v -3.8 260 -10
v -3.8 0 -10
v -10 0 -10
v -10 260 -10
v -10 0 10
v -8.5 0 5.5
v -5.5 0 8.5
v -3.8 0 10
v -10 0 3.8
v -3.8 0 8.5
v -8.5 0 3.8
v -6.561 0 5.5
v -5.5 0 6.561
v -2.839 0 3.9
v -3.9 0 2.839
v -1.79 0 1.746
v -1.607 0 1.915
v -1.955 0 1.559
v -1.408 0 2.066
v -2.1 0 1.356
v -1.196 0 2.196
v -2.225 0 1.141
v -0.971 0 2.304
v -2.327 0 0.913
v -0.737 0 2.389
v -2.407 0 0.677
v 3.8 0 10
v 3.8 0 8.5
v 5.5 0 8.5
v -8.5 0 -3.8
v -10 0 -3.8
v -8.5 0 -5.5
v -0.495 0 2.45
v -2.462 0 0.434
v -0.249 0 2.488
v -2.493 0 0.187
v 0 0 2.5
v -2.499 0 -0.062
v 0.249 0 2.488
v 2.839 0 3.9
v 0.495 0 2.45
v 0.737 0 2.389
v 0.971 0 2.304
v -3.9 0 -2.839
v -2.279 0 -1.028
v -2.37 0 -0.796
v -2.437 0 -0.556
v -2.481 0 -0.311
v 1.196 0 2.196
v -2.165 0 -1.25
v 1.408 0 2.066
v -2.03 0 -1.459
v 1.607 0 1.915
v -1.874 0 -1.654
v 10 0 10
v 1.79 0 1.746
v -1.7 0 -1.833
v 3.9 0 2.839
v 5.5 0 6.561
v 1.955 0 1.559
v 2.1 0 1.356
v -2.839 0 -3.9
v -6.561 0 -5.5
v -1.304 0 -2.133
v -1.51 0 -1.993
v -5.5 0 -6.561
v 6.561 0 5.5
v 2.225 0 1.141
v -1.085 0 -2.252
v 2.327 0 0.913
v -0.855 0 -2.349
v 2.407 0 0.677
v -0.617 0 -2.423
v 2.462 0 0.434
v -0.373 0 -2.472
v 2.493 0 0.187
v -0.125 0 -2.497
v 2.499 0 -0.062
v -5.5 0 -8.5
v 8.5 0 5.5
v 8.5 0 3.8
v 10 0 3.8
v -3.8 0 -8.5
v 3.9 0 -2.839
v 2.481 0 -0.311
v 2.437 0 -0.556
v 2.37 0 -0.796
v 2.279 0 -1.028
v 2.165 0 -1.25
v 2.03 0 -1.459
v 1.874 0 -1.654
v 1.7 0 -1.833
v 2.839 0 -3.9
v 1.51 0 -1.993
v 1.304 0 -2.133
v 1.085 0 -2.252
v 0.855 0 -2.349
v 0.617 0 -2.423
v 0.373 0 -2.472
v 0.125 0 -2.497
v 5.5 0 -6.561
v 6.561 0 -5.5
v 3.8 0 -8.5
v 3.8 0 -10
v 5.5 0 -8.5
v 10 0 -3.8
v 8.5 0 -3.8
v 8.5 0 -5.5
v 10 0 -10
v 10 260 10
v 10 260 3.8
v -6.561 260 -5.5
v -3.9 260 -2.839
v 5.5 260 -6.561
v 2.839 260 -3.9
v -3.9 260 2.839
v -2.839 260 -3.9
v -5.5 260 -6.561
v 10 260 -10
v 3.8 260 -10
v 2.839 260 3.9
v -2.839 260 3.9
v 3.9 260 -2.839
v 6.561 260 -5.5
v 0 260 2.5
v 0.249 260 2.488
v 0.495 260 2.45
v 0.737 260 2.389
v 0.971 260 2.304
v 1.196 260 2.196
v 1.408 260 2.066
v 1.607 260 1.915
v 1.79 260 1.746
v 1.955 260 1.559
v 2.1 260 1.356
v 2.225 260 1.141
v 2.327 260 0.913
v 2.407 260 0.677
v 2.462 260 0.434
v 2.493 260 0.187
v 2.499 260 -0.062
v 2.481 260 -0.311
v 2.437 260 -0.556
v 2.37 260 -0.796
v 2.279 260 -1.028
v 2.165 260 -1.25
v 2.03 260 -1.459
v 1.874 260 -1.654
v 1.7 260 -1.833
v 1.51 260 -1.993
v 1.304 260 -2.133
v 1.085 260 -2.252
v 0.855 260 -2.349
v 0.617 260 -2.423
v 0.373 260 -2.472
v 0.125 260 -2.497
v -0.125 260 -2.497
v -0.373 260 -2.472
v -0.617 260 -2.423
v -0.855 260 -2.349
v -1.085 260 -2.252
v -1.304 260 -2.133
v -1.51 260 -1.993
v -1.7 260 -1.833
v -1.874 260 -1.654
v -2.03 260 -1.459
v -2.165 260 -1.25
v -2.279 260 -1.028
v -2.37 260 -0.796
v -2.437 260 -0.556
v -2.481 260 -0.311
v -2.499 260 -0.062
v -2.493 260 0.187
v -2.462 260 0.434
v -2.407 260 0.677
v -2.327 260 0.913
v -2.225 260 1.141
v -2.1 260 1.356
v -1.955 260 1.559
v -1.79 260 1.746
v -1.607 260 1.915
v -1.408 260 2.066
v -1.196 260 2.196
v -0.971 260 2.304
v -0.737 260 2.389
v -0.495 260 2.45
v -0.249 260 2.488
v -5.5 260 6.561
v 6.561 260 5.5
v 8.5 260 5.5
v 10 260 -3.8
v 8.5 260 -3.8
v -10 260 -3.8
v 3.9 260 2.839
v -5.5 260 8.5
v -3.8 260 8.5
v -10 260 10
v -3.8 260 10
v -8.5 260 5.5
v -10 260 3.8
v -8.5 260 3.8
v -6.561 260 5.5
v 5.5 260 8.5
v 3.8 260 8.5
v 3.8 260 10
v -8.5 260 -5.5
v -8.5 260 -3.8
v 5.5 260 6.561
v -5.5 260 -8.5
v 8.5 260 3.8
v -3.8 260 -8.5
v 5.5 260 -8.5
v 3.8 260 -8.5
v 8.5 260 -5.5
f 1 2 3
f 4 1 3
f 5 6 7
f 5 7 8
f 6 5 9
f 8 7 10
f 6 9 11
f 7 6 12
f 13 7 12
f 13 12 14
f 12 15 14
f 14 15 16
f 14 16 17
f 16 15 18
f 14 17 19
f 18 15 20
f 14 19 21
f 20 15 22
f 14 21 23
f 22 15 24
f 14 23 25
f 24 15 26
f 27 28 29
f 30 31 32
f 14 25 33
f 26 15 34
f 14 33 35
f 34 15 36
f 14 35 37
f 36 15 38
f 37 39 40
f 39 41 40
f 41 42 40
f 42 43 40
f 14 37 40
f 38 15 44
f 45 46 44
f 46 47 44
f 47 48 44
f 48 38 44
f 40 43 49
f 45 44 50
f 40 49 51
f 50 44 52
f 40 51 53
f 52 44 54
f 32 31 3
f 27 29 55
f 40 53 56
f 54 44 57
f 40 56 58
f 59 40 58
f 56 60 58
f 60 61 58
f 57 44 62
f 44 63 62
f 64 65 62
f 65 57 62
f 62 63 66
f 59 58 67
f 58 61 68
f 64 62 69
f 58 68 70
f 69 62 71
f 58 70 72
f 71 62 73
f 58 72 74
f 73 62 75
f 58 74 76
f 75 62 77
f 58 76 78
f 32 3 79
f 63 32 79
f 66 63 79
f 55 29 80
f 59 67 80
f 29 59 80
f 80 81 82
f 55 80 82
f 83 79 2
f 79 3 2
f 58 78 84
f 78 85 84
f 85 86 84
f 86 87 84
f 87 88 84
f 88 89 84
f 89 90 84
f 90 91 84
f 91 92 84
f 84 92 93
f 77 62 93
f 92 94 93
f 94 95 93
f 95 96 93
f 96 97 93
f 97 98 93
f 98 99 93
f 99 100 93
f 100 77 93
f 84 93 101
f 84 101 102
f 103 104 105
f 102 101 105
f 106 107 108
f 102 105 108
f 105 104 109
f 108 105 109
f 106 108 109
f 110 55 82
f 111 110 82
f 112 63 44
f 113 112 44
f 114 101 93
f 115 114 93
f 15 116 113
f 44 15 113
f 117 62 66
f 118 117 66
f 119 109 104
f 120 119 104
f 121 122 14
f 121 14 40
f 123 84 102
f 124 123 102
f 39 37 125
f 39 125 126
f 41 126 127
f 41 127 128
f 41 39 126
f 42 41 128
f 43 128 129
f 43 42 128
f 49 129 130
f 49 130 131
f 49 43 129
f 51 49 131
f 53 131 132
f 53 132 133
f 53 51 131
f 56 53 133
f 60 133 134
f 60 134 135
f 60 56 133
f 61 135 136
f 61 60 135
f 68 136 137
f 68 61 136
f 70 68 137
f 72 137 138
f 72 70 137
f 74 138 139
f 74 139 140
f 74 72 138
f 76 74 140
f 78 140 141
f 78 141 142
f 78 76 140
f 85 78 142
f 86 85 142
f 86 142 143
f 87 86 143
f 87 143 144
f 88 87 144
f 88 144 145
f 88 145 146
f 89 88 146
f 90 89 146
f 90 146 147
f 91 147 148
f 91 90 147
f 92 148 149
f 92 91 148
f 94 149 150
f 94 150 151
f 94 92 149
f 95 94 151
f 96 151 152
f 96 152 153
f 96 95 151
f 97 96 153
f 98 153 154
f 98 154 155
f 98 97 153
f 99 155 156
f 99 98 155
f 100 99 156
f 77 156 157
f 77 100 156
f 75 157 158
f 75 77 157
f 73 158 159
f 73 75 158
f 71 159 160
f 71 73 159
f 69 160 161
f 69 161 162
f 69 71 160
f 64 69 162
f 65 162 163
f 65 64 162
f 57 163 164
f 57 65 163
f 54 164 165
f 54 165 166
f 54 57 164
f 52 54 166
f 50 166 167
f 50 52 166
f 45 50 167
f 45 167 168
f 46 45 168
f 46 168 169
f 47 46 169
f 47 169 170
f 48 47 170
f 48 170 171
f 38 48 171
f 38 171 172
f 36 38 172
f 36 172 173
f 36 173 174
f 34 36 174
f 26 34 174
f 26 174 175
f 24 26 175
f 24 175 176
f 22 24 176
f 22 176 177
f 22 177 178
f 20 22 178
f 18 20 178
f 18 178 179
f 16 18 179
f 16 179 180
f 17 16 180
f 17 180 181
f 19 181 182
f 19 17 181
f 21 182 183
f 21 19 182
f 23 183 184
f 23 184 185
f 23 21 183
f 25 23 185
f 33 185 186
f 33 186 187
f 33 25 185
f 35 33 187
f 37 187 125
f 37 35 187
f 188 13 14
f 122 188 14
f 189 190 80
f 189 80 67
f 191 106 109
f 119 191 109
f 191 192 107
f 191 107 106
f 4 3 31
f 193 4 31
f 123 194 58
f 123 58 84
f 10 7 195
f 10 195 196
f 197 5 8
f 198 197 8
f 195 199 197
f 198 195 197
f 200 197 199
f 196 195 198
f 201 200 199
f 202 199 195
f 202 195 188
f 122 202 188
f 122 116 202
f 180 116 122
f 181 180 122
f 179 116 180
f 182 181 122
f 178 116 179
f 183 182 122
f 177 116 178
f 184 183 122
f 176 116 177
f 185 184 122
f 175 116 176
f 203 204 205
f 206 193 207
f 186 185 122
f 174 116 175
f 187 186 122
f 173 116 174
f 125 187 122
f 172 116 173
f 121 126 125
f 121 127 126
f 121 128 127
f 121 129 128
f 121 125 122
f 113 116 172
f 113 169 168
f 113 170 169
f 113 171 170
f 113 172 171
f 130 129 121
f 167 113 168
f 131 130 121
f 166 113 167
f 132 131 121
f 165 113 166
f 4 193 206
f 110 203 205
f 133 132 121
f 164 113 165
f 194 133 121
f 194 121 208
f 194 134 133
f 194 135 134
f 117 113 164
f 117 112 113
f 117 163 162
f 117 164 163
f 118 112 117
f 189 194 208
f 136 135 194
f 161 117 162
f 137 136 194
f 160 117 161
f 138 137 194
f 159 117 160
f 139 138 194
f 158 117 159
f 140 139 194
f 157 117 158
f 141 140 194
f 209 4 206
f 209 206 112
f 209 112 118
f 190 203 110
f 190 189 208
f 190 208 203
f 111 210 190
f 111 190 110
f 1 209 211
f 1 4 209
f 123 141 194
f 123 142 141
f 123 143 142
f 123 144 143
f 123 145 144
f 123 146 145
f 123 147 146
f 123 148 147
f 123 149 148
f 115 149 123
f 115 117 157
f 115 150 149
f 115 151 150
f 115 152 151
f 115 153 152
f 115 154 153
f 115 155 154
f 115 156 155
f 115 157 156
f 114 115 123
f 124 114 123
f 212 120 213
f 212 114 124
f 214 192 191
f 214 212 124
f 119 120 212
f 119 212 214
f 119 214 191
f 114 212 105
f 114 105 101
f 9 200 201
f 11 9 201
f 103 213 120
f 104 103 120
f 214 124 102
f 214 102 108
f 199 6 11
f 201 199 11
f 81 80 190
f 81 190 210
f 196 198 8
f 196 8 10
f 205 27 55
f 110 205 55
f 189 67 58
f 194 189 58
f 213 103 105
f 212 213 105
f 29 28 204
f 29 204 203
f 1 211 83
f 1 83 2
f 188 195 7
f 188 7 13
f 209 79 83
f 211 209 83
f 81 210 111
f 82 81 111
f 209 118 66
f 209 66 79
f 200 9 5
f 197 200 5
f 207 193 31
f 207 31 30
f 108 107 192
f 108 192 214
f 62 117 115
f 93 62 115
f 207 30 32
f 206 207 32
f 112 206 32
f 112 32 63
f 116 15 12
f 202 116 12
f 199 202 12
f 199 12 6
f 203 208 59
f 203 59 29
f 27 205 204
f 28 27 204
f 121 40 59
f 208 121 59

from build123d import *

# Parameters (mm, degrees)
SKETCH_1_W      = 1.5
SKETCH_1_H      = 1.7
SKETCH_1_W_2    = 1.7
SKETCH_1_H_2    = 1.5
SKETCH_1_W_3    = 7.8
SKETCH_1_H_3    = 7.8
SKETCH_1_R      = 2.5
EXTRUDE_1_DEPTH = 260


with BuildPart() as part:
    # 草图1 → 凸台-拉伸1 (new body)
    # profile 1 of 17: a face of its own
    with BuildSketch(Plane(origin=(0, 0, 0), x_dir=(1, 0, 0), z_dir=(0, 1, 0))):
        Polygon((5.5, 8.5), (5.5, 6.560660172), (5.5, 5.5), (6.560660172, 5.5), (8.5, 5.5), (10, 5.5), (10, 10), (5.5, 10), align=None)
    # profile 2 of 17: a face of its own
    with BuildSketch(Plane(origin=(0, 0, 0), x_dir=(1, 0, 0), z_dir=(0, 1, 0))):
        with Locations((9.25, 4.65)):
            Rectangle(SKETCH_1_W, SKETCH_1_H)
    # profile 3 of 17: a face of its own
    with BuildSketch(Plane(origin=(0, 0, 0), x_dir=(1, 0, 0), z_dir=(0, 1, 0))):
        Polygon((5.5, 6.560660172), (2.839339828, 3.9), (3.9, 3.9), (3.9, 2.839339828), (6.560660172, 5.5), (5.5, 5.5), align=None)
    # profile 4 of 17: a face of its own
    with BuildSketch(Plane(origin=(0, 0, 0), x_dir=(1, 0, 0), z_dir=(0, 1, 0))):
        with Locations((4.65, 9.25)):
            Rectangle(SKETCH_1_W_2, SKETCH_1_H_2)
    # profile 5 of 17: a face of its own
    with BuildSketch(Plane(origin=(0, 0, 0), x_dir=(1, 0, 0), z_dir=(0, 1, 0))):
        Rectangle(SKETCH_1_W_3, SKETCH_1_H_3)
        with Locations(Location((0, 0, 0), (0, 0, 270))):
            Circle(SKETCH_1_R, mode=Mode.SUBTRACT)
    # profile 6 of 17: a face of its own
    with BuildSketch(Plane(origin=(0, 0, 0), x_dir=(1, 0, 0), z_dir=(0, 1, 0))):
        with Locations((-4.65, 9.25)):
            Rectangle(SKETCH_1_W_2, SKETCH_1_H_2)
    # profile 7 of 17: a face of its own
    with BuildSketch(Plane(origin=(0, 0, 0), x_dir=(1, 0, 0), z_dir=(0, 1, 0))):
        Polygon((-8.5, 5.5), (-6.560660172, 5.5), (-5.5, 5.5), (-5.5, 6.560660172), (-5.5, 8.5), (-5.5, 10), (-10, 10), (-10, 5.5), align=None)
    # profile 8 of 17: a face of its own
    with BuildSketch(Plane(origin=(0, 0, 0), x_dir=(1, 0, 0), z_dir=(0, 1, 0))):
        with Locations((-9.25, 4.65)):
            Rectangle(SKETCH_1_W, SKETCH_1_H)
    # profile 9 of 17: a face of its own
    with BuildSketch(Plane(origin=(0, 0, 0), x_dir=(1, 0, 0), z_dir=(0, 1, 0))):
        Polygon((-5.5, 5.5), (-6.560660172, 5.5), (-3.9, 2.839339828), (-3.9, 3.9), (-2.839339828, 3.9), (-5.5, 6.560660172), align=None)
    # profile 10 of 17: a face of its own
    with BuildSketch(Plane(origin=(0, 0, 0), x_dir=(1, 0, 0), z_dir=(0, 1, 0))):
        Polygon((-5.5, -5.5), (-6.560660172, -5.5), (-8.5, -5.5), (-10, -5.5), (-10, -10), (-5.5, -10), (-5.5, -8.5), (-5.5, -6.560660172), align=None)
    # profile 11 of 17: a face of its own
    with BuildSketch(Plane(origin=(0, 0, 0), x_dir=(1, 0, 0), z_dir=(0, 1, 0))):
        with Locations((-4.65, -9.25)):
            Rectangle(SKETCH_1_W_2, SKETCH_1_H_2)
    # profile 12 of 17: a face of its own
    with BuildSketch(Plane(origin=(0, 0, 0), x_dir=(1, 0, 0), z_dir=(0, 1, 0))):
        with Locations((-9.25, -4.65)):
            Rectangle(SKETCH_1_W, SKETCH_1_H)
    # profile 13 of 17: a face of its own
    with BuildSketch(Plane(origin=(0, 0, 0), x_dir=(1, 0, 0), z_dir=(0, 1, 0))):
        Polygon((-3.9, -3.9), (-3.9, -2.839339828), (-6.560660172, -5.5), (-5.5, -5.5), (-5.5, -6.560660172), (-2.839339828, -3.9), align=None)
    # profile 14 of 17: a face of its own
    with BuildSketch(Plane(origin=(0, 0, 0), x_dir=(1, 0, 0), z_dir=(0, 1, 0))):
        Polygon((3.9, -3.9), (2.839339828, -3.9), (5.5, -6.560660172), (5.5, -5.5), (6.560660172, -5.5), (3.9, -2.839339828), align=None)
    # profile 15 of 17: a face of its own
    with BuildSketch(Plane(origin=(0, 0, 0), x_dir=(1, 0, 0), z_dir=(0, 1, 0))):
        Polygon((5.5, -5.5), (5.5, -6.560660172), (5.5, -8.5), (5.5, -10), (10, -10), (10, -5.5), (8.5, -5.5), (6.560660172, -5.5), align=None)
    # profile 16 of 17: a face of its own
    with BuildSketch(Plane(origin=(0, 0, 0), x_dir=(1, 0, 0), z_dir=(0, 1, 0))):
        with Locations((9.25, -4.65)):
            Rectangle(SKETCH_1_W, SKETCH_1_H)
    # profile 17 of 17: a face of its own
    with BuildSketch(Plane(origin=(0, 0, 0), x_dir=(1, 0, 0), z_dir=(0, 1, 0))):
        with Locations((4.65, -9.25)):
            Rectangle(SKETCH_1_W_2, SKETCH_1_H_2)
    extrude(amount=EXTRUDE_1_DEPTH)


solid = part.part
